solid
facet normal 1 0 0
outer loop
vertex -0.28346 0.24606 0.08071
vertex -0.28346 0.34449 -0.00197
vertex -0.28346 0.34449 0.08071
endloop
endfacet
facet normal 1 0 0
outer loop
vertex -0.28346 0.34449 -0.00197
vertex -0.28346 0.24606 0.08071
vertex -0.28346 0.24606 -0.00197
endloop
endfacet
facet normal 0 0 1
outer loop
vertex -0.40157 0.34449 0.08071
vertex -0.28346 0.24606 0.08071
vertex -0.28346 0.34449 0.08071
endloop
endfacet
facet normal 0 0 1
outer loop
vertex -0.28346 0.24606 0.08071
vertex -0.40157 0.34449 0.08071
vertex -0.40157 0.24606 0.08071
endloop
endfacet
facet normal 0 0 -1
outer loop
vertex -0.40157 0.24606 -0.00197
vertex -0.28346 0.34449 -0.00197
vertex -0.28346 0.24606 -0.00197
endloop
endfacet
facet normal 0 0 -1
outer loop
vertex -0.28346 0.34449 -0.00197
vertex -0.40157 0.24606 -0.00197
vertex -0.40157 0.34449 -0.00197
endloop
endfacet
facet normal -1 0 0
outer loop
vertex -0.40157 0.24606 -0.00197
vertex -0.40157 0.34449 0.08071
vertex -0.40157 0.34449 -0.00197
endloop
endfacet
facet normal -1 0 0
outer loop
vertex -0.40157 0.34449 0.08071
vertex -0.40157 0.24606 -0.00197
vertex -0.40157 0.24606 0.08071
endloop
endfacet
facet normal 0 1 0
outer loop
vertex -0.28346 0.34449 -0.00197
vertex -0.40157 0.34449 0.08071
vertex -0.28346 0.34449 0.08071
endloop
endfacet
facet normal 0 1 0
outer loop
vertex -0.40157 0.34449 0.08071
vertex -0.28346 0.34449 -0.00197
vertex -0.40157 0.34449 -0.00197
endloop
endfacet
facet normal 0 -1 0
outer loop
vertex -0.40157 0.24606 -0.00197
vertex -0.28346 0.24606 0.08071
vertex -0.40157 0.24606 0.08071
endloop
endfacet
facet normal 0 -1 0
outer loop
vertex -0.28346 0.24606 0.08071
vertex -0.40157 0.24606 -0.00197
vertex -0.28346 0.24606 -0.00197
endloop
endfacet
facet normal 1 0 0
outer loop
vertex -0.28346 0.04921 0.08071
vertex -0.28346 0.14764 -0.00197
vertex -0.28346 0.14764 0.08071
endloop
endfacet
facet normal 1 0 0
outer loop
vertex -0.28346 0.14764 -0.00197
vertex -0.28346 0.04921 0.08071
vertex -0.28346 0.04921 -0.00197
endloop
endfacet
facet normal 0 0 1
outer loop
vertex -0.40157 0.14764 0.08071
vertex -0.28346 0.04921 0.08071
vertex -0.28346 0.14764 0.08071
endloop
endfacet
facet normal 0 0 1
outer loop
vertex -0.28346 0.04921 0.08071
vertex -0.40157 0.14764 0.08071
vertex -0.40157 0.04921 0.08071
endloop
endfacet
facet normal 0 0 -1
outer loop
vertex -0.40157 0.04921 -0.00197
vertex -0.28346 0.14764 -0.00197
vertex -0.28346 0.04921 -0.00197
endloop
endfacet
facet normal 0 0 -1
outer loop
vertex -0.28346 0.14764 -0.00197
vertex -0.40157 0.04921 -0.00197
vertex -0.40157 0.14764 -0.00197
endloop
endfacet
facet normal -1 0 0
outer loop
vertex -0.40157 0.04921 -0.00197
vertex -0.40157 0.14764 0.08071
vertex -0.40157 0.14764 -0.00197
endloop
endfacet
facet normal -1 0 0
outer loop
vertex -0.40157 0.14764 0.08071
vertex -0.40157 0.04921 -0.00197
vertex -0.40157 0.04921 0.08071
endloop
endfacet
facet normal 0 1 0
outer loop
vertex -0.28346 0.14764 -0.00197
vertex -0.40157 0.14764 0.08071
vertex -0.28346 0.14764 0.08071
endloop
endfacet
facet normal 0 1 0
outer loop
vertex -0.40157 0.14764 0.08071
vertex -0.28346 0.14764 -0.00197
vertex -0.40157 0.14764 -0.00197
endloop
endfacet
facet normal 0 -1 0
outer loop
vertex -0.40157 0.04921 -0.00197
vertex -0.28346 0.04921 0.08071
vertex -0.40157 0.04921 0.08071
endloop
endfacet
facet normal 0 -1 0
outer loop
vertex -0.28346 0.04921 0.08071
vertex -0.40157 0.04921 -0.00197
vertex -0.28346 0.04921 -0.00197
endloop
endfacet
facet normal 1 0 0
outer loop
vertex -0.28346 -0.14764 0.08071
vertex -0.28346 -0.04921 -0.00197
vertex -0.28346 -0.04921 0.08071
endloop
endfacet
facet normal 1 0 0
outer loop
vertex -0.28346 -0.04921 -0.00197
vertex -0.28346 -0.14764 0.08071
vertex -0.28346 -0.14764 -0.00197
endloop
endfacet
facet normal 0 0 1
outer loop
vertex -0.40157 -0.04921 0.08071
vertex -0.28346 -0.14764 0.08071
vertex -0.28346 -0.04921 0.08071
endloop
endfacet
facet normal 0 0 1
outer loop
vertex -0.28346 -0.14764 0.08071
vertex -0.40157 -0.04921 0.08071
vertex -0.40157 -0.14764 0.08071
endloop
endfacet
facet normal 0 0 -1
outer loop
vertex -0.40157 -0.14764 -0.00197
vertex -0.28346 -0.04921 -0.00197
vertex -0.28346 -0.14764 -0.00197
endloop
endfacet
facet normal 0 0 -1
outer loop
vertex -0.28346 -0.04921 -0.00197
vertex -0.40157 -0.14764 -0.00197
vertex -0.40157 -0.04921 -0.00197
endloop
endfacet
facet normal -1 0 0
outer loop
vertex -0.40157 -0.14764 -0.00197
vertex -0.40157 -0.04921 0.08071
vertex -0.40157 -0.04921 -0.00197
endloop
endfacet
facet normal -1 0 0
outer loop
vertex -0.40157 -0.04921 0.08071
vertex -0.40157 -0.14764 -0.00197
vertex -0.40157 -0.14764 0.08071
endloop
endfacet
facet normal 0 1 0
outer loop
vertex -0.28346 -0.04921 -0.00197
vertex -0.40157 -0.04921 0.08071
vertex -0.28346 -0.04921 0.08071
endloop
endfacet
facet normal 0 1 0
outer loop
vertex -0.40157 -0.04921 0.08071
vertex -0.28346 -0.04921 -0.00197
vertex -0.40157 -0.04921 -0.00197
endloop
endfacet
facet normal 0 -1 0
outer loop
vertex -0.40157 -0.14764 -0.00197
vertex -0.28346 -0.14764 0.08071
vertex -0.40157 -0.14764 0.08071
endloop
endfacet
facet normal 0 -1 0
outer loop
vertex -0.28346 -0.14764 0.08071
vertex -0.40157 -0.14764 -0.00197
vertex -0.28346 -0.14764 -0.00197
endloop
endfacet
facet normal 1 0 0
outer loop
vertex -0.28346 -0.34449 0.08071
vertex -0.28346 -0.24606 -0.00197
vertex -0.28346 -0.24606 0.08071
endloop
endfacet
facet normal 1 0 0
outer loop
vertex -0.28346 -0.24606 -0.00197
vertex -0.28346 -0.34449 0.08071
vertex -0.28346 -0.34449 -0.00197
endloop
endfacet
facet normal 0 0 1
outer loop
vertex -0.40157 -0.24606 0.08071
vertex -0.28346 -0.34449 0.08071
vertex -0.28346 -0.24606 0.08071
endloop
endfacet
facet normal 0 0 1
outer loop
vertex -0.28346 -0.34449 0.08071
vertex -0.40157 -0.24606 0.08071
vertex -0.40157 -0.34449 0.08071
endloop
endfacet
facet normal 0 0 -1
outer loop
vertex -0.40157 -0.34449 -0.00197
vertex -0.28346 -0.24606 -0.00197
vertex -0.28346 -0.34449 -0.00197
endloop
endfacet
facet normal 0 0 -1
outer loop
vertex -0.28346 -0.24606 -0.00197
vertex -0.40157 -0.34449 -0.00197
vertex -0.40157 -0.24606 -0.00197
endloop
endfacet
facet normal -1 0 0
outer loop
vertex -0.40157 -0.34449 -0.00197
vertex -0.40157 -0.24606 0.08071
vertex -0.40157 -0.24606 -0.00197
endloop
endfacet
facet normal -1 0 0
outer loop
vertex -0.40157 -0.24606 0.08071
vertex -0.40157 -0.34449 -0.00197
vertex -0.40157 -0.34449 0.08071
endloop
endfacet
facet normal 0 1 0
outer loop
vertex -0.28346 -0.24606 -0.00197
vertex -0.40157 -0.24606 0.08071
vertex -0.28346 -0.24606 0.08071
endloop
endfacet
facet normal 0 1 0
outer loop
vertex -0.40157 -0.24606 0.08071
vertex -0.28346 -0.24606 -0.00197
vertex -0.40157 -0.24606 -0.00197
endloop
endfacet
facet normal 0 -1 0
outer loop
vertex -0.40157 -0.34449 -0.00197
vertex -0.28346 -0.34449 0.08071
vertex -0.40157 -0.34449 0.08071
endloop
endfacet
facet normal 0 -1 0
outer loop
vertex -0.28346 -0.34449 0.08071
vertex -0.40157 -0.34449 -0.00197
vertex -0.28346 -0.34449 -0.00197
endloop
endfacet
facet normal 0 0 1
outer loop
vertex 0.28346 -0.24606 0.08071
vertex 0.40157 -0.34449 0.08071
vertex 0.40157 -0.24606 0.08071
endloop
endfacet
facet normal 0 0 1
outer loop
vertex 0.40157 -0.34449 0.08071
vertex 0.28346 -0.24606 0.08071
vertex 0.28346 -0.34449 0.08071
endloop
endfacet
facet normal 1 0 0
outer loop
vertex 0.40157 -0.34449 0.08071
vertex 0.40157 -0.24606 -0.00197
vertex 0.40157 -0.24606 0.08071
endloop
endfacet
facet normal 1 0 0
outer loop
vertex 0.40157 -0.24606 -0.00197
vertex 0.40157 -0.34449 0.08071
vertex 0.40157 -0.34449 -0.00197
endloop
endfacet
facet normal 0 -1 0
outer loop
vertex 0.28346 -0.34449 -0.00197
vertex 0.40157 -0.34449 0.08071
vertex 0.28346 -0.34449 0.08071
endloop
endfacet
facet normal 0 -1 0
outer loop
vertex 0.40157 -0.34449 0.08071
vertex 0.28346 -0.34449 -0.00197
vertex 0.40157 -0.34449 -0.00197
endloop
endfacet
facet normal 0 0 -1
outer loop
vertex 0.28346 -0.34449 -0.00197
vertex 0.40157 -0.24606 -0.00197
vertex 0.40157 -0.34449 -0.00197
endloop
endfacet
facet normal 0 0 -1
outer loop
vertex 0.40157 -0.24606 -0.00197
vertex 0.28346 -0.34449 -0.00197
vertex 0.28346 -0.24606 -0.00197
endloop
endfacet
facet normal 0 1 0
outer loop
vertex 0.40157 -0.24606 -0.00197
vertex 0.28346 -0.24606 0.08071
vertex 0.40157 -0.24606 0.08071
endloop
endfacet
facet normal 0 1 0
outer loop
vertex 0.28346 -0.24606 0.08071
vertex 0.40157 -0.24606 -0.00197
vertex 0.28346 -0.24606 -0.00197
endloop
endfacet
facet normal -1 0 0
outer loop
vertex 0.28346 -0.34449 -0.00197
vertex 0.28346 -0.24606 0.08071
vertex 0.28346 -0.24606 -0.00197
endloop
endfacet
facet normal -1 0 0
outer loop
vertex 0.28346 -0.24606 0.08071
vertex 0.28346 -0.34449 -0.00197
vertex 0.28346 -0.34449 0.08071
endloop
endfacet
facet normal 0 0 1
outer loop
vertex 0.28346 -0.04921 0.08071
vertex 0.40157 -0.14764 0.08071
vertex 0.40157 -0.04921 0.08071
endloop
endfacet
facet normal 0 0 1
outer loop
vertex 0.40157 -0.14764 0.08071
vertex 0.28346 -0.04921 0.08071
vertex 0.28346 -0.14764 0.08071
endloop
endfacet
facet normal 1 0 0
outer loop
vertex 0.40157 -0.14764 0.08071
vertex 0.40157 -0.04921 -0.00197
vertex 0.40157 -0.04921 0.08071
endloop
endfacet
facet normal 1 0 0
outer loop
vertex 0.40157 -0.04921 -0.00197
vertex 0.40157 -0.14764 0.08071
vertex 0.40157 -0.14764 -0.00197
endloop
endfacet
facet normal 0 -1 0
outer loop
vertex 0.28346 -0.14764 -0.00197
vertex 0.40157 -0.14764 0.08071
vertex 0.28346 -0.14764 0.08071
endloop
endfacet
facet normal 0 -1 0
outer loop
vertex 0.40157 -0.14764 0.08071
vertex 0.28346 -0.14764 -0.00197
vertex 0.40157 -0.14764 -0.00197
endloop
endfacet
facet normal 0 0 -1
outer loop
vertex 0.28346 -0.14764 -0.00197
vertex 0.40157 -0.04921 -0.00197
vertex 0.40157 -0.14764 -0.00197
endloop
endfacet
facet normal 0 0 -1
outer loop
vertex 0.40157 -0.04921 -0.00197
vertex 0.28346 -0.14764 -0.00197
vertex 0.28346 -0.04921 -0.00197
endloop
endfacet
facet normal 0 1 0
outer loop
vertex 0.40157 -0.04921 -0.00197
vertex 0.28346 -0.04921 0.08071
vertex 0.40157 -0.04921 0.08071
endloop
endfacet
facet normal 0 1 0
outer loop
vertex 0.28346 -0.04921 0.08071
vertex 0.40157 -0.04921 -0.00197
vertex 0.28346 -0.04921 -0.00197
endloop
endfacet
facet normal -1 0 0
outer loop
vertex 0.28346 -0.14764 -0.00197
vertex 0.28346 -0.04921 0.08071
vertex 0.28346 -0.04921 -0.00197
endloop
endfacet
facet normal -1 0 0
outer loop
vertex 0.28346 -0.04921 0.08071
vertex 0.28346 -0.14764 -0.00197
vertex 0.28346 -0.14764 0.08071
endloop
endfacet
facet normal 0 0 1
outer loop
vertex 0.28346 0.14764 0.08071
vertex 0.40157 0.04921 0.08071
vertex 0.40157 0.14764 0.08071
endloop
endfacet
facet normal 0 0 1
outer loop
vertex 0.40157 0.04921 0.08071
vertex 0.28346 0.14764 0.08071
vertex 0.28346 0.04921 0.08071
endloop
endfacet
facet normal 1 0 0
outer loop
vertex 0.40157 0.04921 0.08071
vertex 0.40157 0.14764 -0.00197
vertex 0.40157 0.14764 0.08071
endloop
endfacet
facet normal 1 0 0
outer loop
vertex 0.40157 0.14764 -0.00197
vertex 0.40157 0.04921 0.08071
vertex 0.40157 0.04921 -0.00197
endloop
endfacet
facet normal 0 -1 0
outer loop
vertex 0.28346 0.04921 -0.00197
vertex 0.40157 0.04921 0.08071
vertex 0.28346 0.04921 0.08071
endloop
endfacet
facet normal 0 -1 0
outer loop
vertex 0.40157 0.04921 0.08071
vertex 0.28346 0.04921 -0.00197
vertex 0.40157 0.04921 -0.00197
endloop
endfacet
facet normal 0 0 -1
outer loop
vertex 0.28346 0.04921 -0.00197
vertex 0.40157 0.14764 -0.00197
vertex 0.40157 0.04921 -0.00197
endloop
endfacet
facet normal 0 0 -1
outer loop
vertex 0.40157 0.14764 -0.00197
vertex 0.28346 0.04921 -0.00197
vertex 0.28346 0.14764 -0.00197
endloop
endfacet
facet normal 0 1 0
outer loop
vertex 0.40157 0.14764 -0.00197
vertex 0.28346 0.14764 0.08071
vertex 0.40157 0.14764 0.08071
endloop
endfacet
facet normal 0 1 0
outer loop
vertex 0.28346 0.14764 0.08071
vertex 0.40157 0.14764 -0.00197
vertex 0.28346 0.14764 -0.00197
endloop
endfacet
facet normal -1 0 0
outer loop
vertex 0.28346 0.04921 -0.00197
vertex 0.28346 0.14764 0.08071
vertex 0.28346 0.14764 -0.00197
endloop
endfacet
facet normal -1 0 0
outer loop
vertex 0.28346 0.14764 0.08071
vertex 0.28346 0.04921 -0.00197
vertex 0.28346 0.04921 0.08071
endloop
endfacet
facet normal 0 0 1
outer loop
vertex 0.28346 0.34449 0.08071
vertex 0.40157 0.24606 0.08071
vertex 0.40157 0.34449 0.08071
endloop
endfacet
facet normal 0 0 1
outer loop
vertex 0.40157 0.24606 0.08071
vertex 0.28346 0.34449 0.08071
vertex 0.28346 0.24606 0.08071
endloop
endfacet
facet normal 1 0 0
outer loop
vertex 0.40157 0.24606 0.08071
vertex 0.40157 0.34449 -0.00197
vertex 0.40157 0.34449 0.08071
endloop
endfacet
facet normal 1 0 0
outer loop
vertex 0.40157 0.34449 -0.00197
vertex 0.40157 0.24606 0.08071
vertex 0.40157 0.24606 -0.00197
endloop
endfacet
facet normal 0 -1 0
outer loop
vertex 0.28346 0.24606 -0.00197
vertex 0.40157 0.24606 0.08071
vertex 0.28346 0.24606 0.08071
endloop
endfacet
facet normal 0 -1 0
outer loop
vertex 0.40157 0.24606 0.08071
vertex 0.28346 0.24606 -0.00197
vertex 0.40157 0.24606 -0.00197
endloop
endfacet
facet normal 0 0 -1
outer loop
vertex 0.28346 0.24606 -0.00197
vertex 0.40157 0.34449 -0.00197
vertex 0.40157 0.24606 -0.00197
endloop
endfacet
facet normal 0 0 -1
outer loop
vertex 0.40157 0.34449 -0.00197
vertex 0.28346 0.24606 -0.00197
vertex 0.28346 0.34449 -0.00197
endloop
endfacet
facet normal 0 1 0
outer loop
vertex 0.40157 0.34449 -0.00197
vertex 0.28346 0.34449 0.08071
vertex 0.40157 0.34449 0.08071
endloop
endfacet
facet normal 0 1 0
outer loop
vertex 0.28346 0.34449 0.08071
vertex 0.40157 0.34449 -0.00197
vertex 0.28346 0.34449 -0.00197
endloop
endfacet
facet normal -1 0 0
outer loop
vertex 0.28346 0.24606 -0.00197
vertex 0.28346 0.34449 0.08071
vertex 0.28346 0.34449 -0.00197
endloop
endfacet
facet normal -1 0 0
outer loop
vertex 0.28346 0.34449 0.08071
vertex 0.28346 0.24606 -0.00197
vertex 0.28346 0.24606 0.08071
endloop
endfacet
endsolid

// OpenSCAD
// file: defines.scad
L = 2.0;  // Длина
W = 2.0;  // Ширина
H = 0.8;  // Высота (от платы, с выводами)
Hf = 0.04;  // Возвышение над платой (высота выводов)
e = 0.5;    // Шаг выводов

pin_fragments = 16;

scale = 1/2.54;
// main file
include <defines.scad>

p_w = 0.25;
p_h = 0.3;

p_co = 1.55 - 3*p_h/2 + 0.02;

module Pin(x, y, z, r) {
color("Gold")
  rotate([0,0,r]) translate([x,y,z])
  union() {
    translate([0.25, 0, 0.1]) cube(size = [p_h, p_w, 0.21],center=true); // На боковине
  }
}

scale(scale)
  union() {
    Pin(-p_co, 0.75, 0, 0); // #1
    Pin(-p_co, 0.25, 0, 0); // #2
    Pin(-p_co,-0.25, 0, 0); // #2
    Pin(-p_co,-0.75, 0, 0); // #3

    Pin(-p_co, 0.75, 0, 180); // #4
    Pin(-p_co, 0.25, 0, 180); // #4
    Pin(-p_co,-0.25, 0, 180); // #5
    Pin(-p_co,-0.75, 0, 180); // #6


  };
